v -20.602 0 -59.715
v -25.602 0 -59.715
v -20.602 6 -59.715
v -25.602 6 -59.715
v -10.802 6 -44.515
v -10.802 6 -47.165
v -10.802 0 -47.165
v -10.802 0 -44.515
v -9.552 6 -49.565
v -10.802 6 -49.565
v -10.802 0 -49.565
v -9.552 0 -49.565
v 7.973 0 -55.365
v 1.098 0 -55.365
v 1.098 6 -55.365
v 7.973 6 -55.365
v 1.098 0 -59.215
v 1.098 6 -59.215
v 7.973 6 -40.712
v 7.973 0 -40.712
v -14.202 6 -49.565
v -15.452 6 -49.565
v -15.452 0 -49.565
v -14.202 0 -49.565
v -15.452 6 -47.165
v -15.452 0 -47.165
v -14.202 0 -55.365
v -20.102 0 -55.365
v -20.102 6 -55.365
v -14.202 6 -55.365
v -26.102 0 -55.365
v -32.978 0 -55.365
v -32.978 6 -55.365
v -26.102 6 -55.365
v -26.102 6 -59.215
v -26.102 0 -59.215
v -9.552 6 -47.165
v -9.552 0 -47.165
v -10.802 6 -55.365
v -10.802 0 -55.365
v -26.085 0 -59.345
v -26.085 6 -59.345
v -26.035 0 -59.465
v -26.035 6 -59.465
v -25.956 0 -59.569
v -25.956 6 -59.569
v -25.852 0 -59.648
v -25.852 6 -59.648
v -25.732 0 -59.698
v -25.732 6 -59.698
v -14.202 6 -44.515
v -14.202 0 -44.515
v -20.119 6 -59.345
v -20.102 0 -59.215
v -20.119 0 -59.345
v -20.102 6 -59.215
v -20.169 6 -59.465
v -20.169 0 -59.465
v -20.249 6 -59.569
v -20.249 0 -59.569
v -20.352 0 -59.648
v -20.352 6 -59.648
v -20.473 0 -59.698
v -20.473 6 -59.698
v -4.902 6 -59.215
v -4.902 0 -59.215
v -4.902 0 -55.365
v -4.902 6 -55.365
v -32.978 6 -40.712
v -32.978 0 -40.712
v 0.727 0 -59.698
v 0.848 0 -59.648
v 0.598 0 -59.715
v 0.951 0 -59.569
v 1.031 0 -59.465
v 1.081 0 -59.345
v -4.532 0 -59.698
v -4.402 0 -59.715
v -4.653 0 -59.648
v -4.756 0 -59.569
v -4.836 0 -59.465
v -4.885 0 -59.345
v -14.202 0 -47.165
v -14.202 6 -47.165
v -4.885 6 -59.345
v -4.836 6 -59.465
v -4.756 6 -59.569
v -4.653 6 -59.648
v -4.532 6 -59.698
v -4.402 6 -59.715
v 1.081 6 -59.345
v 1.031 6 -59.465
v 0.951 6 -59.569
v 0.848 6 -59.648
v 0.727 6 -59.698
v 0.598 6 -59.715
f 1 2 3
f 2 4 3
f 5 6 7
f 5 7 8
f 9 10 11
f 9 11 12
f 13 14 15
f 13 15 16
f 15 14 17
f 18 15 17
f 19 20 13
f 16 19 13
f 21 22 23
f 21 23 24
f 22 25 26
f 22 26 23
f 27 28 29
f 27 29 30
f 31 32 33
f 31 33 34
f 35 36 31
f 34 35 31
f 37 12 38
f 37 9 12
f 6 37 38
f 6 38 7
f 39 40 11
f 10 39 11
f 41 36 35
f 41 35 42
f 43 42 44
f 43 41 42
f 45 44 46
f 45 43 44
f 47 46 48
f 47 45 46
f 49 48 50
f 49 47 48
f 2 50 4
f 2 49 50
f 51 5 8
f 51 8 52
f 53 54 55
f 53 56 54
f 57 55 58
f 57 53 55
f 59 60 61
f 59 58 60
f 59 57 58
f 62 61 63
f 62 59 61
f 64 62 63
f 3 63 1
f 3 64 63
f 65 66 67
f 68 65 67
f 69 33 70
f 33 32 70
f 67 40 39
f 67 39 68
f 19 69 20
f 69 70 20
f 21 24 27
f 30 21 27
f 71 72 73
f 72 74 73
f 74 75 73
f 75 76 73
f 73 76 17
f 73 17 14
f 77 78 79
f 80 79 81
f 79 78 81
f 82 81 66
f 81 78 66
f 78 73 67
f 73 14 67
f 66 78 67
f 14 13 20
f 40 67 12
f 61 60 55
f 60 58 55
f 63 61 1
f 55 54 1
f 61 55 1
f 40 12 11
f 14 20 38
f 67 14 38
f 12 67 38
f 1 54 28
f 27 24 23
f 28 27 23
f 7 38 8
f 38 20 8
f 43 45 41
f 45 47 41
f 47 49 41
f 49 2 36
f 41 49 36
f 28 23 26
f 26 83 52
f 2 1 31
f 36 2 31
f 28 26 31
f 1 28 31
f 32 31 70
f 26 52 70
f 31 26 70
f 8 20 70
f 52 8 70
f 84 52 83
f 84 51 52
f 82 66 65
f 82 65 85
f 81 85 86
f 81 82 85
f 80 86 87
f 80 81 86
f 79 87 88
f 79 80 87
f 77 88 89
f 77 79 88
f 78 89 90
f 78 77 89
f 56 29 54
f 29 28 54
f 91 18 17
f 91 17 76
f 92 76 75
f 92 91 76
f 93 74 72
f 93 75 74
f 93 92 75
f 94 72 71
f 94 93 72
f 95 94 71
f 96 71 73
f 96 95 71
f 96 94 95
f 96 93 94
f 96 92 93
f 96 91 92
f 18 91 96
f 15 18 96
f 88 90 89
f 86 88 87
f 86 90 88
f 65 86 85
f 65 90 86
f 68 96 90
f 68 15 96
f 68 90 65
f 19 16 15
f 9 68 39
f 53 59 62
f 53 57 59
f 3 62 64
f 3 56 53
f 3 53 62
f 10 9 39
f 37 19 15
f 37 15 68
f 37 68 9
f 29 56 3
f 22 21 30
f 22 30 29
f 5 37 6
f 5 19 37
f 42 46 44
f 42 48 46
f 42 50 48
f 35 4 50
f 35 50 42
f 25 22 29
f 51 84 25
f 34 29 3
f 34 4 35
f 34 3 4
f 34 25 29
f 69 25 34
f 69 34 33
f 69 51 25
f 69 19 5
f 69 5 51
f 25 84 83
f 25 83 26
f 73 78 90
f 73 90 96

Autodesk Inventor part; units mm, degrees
ref_plane "YZ Plane" through (0, 0, 0) normal (1, 0, 0) x (0, 1, 0)
ref_plane "XZ Plane" through (0, 0, 0) normal (0, 1, 0) x (-1, 0, 0)
ref_plane "XY Plane" through (0, 0, 0) normal (0, 0, 1) x (1, 0, 0)
sketch "Sketch1" plane through (0, 0, 0) normal (0, 1, 0) x (-1, 0, 0)
  arc A0 (32.2948, 13.759) -> (-8.6569, 13.759) centre (11.8189, 4.9346) ccw projected
  line L0 (-8.6569, 13.759) -> (-8.6569, -3.8898) projected
  line L1 (-1.7811, -3.8898) -> (-8.6569, -3.8898) projected
  line L2 (-1.7811, -3.8898) -> (-1.7811, -10.2398) projected
  line L3 (-1.7811, -10.2398) -> (4.2189, -10.2398) projected
  line L4 (4.2189, -10.2398) -> (4.2189, -3.8898) projected
  line L5 (10.3189, -3.8898) -> (4.2189, -3.8898) projected
  line L6 (10.3189, -3.8898) -> (10.3189, 2.1102) projected
  line L7 (10.3189, 2.1102) -> (9.0689, 2.1102) projected
  line L8 (9.0689, 2.1102) -> (9.0689, 4.1102) projected
  line L9 (9.0689, 4.1102) -> (10.3189, 4.1102) projected
  line L10 (10.3189, 4.1102) -> (10.3189, 6.7602) projected
  line L11 (10.3189, 6.7602) -> (13.3189, 6.7602) projected
  line L12 (13.3189, 6.7602) -> (13.3189, 4.1102) projected
  line L13 (13.3189, 4.1102) -> (14.5689, 4.1102) projected
  line L14 (14.5689, 4.1102) -> (14.5689, 2.1102) projected
  line L15 (14.5689, 2.1102) -> (13.3189, 2.1102) projected
  line L16 (13.3189, 2.1102) -> (13.3189, -3.8898) projected
  line L17 (19.4189, -3.8898) -> (13.3189, -3.8898) projected
  line L18 (19.4189, -3.8898) -> (19.4189, -10.2398) projected
  line L19 (19.4189, -10.2398) -> (25.4189, -10.2398) projected
  line L20 (25.4189, -10.2398) -> (25.4189, -3.8898) projected
  line L21 (32.2948, -3.8898) -> (25.4189, -3.8898) projected
  line L22 (32.2948, -3.8898) -> (32.2948, 13.759) projected
  circle A1 centre (11.8189, 11.3099) radius 4 projected
  line L23 (-7.9734, -40.7116) -> (-7.9734, -55.3652)
  line L24 (-1.0976, -55.3652) -> (-7.9734, -55.3652)
  line L25 (-1.0976, -55.3652) -> (-1.0976, -61.7152)
  line L26 (-1.0976, -61.7152) -> (4.9025, -61.7152)
  line L27 (4.9025, -61.7152) -> (4.9025, -55.3652)
  line L28 (11.0025, -55.3652) -> (4.9025, -55.3652)
  line L29 (11.0025, -55.3652) -> (11.0025, -49.3652)
  line L30 (11.0025, -49.3652) -> (9.7525, -49.3652)
  line L31 (9.7525, -49.3652) -> (9.7525, -47.3652)
  line L32 (9.7525, -47.3652) -> (11.0025, -47.3652)
  line L33 (11.0025, -47.3652) -> (11.0025, -44.7152)
  line L34 (11.0025, -44.7152) -> (14.0025, -44.7152)
  line L35 (14.0025, -44.7152) -> (14.0025, -47.3652)
  line L36 (14.0025, -47.3652) -> (15.2524, -47.3652)
  line L37 (15.2524, -47.3652) -> (15.2524, -49.3652)
  line L38 (15.2524, -49.3652) -> (14.0025, -49.3652)
  line L39 (14.0025, -49.3652) -> (14.0025, -55.3652)
  line L40 (20.1024, -55.3652) -> (14.0025, -55.3652)
  line L41 (20.1024, -55.3652) -> (20.1024, -61.7152)
  line L42 (20.1024, -61.7152) -> (26.1024, -61.7152)
  line L43 (26.1024, -61.7152) -> (26.1024, -55.3652)
  line L44 (32.9783, -55.3652) -> (26.1024, -55.3652)
  line L45 (32.9783, -55.3652) -> (32.9783, -40.7116)
  line L46 (32.9783, -40.7116) -> (-7.9734, -40.7116)
  point P0 (0, 0)
  point P1 (0.6835, -51.4754)
  point P2 (12.5025, -46.5408)
extrude "Extrusion1" add sketch "Sketch1" along normal blind 6 contours L46 L45 L44 L43 L42 L41 L40 L39 L38 L37 L36 L35 L34 L33 L32 L31 L30 L29 L28 L27 L26 L25 L24 L23
sketch "Sketch2" plane through (0, 6, 0) normal (0, 1, 0) x (1, 0, 0)
  line L0 (-14.0025, 49.3652) -> (-14.0025, 55.3652) projected
  line L1 (-15.2524, 47.3652) -> (-15.2524, 49.3652) projected
  line L2 (-15.2524, 49.3652) -> (-14.0025, 49.3652) projected
  line L3 (-14.0025, 47.3652) -> (-15.2524, 47.3652) projected
  line L4 (-14.0025, 44.7152) -> (-14.0025, 47.3652) projected
  line L5 (-11.0025, 44.7152) -> (-14.0025, 44.7152) projected
  line L6 (-11.0025, 47.3652) -> (-11.0025, 44.7152) projected
  line L7 (-9.7525, 47.3652) -> (-11.0025, 47.3652) projected
  line L8 (-9.7525, 49.3652) -> (-9.7525, 47.3652) projected
  line L9 (-11.0025, 49.3652) -> (-9.7525, 49.3652) projected
  line L10 (-11.0025, 55.3652) -> (-11.0025, 49.3652) projected
  line L11 (-4.9025, 55.3652) -> (-11.0025, 55.3652) projected
  line L12 (-11.0025, 55.3652) -> (-14.0025, 55.3652)
  line L13 (-14.2025, 47.1652) -> (-15.4524, 47.1652)
  line L14 (-15.4524, 47.1652) -> (-15.4524, 49.5652)
  line L15 (-15.4524, 49.5652) -> (-14.2025, 49.5652)
  line L16 (-14.2025, 49.5652) -> (-14.2025, 55.5652)
  line L17 (-14.2025, 55.5652) -> (-10.8025, 55.5652)
  line L18 (-10.8025, 55.5652) -> (-10.8025, 49.5652)
  line L19 (-10.8025, 49.5652) -> (-9.5525, 49.5652)
  line L20 (-9.5525, 49.5652) -> (-9.5525, 47.1652)
  line L21 (-9.5525, 47.1652) -> (-10.8025, 47.1652)
  line L22 (-10.8025, 47.1652) -> (-10.8025, 44.5152)
  line L23 (-10.8025, 44.5152) -> (-14.2025, 44.5152)
  line L24 (-14.2025, 44.5152) -> (-14.2025, 47.1652)
  point P0 (0, 0)
  dimension "d2" = 0.2
extrude "Extrusion2" cut sketch "Sketch2" against normal blind 25.4
sketch "Sketch3" plane through (0, 6, 0) normal (0, 1, 0) x (1, 0, 0)
  line L0 (2.9926, 65.1915) -> (-28.8734, 65.1915)
  line L1 (-28.8734, 65.1915) -> (-28.8734, 59.7152)
  line L2 (-28.8734, 59.7152) -> (2.9926, 59.7152)
  line L3 (2.9926, 59.7152) -> (2.9926, 65.1915)
  line L4 (-20.1024, 61.7152) -> (-26.1024, 61.7152) projected
  point P0 (0, 0)
  dimension "d5" = 2
extrude "Extrusion3" cut sketch "Sketch3" against normal blind 25.4
fillet "Fillet1" radius 0.5 4 edges at (-26.1024, 3, -59.7152) (-20.1024, 3, -59.7152) (-4.9025, 3, -59.7152) (1.0976, 3, -59.7152)
properties part number "Maker_jigsaw_template"
